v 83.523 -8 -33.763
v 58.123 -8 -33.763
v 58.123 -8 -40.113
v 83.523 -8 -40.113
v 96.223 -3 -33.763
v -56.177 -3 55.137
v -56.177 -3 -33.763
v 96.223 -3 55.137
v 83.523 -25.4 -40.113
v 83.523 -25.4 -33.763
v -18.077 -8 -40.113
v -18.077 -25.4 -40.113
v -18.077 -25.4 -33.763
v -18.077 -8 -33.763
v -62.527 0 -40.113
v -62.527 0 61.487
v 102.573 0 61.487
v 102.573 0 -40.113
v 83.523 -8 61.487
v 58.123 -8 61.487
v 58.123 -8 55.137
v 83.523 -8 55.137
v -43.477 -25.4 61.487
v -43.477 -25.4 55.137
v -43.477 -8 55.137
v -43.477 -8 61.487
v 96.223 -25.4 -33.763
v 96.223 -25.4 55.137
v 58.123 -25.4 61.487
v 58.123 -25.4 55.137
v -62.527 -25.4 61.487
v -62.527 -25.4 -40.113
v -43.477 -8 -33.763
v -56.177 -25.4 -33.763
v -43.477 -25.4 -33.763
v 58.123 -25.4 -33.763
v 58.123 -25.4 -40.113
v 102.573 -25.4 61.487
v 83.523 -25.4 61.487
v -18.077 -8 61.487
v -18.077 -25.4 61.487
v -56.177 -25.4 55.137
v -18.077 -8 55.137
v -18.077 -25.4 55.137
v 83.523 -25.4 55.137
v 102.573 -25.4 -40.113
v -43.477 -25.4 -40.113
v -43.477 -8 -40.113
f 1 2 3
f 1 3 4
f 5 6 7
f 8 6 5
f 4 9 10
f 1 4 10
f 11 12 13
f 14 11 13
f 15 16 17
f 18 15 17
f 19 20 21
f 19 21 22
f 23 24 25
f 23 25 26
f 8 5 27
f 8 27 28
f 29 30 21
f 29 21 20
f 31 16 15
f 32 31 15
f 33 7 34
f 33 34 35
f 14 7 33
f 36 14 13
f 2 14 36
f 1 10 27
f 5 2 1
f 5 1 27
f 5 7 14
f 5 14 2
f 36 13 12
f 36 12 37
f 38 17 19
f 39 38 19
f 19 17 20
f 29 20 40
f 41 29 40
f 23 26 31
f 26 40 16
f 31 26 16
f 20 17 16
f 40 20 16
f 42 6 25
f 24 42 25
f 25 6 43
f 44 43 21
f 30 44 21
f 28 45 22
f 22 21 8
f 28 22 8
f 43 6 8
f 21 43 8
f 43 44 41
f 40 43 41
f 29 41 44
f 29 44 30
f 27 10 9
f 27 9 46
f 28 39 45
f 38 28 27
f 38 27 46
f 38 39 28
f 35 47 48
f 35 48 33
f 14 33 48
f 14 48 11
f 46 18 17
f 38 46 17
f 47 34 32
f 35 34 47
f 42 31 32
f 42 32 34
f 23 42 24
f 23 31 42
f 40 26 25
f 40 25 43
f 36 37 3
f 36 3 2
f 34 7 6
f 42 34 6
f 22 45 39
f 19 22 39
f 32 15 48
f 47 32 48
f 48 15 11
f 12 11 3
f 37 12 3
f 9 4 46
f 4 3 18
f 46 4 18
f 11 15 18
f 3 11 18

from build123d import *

# Parameters (mm, degrees)
F0_W     = 6.35
F0_H     = 88.9
F1_DEPTH = 3
F0_H_2   = 6.35
F0_W_2   = 12.7
F0_W_3   = 76.2
F2_DEPTH = 25.4
F0_W_4   = 25.4
F3_DEPTH = 8


with BuildPart() as f1:
    # F0 (on Front) → F1 (new body)
    with BuildSketch(Plane.XZ):
        with Locations((-59.3524831653, 10.6868692262)):
            Rectangle(F0_W, F0_H)
        Polygon((-43.4774831653, 55.1368692262), (-56.1774831653, 55.1368692262), (-56.1774831653, -33.7631307738), (-43.4774831653, -33.7631307738), (-18.0774831653, -33.7631307738), (58.1225168347, -33.7631307738), (83.5225168347, -33.7631307738), (96.2225168347, -33.7631307738), (96.2225168347, 55.1368692262), (83.5225168347, 55.1368692262), (58.1225168347, 55.1368692262), (-18.0774831653, 55.1368692262), align=None)
    extrude(amount=F1_DEPTH)

    # F0 (on Front) → F2 (join)
    with BuildSketch(Plane.XZ):
        with Locations((-59.3524831653, 58.3118692262)):
            Rectangle(F0_W, F0_H_2)
        with Locations((99.3975168347, 58.3118692262)):
            Rectangle(F0_W, F0_H_2)
        with Locations((-59.3524831653, -36.9381307738)):
            Rectangle(F0_W, F0_H_2)
        with Locations((99.3975168347, -36.9381307738)):
            Rectangle(F0_W, F0_H_2)
        with Locations((-49.8274831653, 58.3118692262)):
            Rectangle(F0_W_2, F0_H_2)
        with Locations((20.0225168347, 58.3118692262)):
            Rectangle(F0_W_3, F0_H_2)
        with Locations((89.8725168347, 58.3118692262)):
            Rectangle(F0_W_2, F0_H_2)
        with Locations((-49.8274831653, -36.9381307738)):
            Rectangle(F0_W_2, F0_H_2)
        with Locations((20.0225168347, -36.9381307738)):
            Rectangle(F0_W_3, F0_H_2)
        with Locations((89.8725168347, -36.9381307738)):
            Rectangle(F0_W_2, F0_H_2)
        with Locations((99.3975168347, 10.6868692262)):
            Rectangle(F0_W, F0_H)
        with Locations((-59.3524831653, 10.6868692262)):
            Rectangle(F0_W, F0_H)
    extrude(amount=F2_DEPTH)

    # F0 (on Front) → F3 (join)
    with BuildSketch(Plane.XZ):
        with Locations((-30.7774831653, -36.9381307738)):
            Rectangle(F0_W_4, F0_H_2)
        with Locations((-30.7774831653, 58.3118692262)):
            Rectangle(F0_W_4, F0_H_2)
        with Locations((70.8225168347, 58.3118692262)):
            Rectangle(F0_W_4, F0_H_2)
        with Locations((70.8225168347, -36.9381307738)):
            Rectangle(F0_W_4, F0_H_2)
    extrude(amount=F3_DEPTH)


solid = f1.part
